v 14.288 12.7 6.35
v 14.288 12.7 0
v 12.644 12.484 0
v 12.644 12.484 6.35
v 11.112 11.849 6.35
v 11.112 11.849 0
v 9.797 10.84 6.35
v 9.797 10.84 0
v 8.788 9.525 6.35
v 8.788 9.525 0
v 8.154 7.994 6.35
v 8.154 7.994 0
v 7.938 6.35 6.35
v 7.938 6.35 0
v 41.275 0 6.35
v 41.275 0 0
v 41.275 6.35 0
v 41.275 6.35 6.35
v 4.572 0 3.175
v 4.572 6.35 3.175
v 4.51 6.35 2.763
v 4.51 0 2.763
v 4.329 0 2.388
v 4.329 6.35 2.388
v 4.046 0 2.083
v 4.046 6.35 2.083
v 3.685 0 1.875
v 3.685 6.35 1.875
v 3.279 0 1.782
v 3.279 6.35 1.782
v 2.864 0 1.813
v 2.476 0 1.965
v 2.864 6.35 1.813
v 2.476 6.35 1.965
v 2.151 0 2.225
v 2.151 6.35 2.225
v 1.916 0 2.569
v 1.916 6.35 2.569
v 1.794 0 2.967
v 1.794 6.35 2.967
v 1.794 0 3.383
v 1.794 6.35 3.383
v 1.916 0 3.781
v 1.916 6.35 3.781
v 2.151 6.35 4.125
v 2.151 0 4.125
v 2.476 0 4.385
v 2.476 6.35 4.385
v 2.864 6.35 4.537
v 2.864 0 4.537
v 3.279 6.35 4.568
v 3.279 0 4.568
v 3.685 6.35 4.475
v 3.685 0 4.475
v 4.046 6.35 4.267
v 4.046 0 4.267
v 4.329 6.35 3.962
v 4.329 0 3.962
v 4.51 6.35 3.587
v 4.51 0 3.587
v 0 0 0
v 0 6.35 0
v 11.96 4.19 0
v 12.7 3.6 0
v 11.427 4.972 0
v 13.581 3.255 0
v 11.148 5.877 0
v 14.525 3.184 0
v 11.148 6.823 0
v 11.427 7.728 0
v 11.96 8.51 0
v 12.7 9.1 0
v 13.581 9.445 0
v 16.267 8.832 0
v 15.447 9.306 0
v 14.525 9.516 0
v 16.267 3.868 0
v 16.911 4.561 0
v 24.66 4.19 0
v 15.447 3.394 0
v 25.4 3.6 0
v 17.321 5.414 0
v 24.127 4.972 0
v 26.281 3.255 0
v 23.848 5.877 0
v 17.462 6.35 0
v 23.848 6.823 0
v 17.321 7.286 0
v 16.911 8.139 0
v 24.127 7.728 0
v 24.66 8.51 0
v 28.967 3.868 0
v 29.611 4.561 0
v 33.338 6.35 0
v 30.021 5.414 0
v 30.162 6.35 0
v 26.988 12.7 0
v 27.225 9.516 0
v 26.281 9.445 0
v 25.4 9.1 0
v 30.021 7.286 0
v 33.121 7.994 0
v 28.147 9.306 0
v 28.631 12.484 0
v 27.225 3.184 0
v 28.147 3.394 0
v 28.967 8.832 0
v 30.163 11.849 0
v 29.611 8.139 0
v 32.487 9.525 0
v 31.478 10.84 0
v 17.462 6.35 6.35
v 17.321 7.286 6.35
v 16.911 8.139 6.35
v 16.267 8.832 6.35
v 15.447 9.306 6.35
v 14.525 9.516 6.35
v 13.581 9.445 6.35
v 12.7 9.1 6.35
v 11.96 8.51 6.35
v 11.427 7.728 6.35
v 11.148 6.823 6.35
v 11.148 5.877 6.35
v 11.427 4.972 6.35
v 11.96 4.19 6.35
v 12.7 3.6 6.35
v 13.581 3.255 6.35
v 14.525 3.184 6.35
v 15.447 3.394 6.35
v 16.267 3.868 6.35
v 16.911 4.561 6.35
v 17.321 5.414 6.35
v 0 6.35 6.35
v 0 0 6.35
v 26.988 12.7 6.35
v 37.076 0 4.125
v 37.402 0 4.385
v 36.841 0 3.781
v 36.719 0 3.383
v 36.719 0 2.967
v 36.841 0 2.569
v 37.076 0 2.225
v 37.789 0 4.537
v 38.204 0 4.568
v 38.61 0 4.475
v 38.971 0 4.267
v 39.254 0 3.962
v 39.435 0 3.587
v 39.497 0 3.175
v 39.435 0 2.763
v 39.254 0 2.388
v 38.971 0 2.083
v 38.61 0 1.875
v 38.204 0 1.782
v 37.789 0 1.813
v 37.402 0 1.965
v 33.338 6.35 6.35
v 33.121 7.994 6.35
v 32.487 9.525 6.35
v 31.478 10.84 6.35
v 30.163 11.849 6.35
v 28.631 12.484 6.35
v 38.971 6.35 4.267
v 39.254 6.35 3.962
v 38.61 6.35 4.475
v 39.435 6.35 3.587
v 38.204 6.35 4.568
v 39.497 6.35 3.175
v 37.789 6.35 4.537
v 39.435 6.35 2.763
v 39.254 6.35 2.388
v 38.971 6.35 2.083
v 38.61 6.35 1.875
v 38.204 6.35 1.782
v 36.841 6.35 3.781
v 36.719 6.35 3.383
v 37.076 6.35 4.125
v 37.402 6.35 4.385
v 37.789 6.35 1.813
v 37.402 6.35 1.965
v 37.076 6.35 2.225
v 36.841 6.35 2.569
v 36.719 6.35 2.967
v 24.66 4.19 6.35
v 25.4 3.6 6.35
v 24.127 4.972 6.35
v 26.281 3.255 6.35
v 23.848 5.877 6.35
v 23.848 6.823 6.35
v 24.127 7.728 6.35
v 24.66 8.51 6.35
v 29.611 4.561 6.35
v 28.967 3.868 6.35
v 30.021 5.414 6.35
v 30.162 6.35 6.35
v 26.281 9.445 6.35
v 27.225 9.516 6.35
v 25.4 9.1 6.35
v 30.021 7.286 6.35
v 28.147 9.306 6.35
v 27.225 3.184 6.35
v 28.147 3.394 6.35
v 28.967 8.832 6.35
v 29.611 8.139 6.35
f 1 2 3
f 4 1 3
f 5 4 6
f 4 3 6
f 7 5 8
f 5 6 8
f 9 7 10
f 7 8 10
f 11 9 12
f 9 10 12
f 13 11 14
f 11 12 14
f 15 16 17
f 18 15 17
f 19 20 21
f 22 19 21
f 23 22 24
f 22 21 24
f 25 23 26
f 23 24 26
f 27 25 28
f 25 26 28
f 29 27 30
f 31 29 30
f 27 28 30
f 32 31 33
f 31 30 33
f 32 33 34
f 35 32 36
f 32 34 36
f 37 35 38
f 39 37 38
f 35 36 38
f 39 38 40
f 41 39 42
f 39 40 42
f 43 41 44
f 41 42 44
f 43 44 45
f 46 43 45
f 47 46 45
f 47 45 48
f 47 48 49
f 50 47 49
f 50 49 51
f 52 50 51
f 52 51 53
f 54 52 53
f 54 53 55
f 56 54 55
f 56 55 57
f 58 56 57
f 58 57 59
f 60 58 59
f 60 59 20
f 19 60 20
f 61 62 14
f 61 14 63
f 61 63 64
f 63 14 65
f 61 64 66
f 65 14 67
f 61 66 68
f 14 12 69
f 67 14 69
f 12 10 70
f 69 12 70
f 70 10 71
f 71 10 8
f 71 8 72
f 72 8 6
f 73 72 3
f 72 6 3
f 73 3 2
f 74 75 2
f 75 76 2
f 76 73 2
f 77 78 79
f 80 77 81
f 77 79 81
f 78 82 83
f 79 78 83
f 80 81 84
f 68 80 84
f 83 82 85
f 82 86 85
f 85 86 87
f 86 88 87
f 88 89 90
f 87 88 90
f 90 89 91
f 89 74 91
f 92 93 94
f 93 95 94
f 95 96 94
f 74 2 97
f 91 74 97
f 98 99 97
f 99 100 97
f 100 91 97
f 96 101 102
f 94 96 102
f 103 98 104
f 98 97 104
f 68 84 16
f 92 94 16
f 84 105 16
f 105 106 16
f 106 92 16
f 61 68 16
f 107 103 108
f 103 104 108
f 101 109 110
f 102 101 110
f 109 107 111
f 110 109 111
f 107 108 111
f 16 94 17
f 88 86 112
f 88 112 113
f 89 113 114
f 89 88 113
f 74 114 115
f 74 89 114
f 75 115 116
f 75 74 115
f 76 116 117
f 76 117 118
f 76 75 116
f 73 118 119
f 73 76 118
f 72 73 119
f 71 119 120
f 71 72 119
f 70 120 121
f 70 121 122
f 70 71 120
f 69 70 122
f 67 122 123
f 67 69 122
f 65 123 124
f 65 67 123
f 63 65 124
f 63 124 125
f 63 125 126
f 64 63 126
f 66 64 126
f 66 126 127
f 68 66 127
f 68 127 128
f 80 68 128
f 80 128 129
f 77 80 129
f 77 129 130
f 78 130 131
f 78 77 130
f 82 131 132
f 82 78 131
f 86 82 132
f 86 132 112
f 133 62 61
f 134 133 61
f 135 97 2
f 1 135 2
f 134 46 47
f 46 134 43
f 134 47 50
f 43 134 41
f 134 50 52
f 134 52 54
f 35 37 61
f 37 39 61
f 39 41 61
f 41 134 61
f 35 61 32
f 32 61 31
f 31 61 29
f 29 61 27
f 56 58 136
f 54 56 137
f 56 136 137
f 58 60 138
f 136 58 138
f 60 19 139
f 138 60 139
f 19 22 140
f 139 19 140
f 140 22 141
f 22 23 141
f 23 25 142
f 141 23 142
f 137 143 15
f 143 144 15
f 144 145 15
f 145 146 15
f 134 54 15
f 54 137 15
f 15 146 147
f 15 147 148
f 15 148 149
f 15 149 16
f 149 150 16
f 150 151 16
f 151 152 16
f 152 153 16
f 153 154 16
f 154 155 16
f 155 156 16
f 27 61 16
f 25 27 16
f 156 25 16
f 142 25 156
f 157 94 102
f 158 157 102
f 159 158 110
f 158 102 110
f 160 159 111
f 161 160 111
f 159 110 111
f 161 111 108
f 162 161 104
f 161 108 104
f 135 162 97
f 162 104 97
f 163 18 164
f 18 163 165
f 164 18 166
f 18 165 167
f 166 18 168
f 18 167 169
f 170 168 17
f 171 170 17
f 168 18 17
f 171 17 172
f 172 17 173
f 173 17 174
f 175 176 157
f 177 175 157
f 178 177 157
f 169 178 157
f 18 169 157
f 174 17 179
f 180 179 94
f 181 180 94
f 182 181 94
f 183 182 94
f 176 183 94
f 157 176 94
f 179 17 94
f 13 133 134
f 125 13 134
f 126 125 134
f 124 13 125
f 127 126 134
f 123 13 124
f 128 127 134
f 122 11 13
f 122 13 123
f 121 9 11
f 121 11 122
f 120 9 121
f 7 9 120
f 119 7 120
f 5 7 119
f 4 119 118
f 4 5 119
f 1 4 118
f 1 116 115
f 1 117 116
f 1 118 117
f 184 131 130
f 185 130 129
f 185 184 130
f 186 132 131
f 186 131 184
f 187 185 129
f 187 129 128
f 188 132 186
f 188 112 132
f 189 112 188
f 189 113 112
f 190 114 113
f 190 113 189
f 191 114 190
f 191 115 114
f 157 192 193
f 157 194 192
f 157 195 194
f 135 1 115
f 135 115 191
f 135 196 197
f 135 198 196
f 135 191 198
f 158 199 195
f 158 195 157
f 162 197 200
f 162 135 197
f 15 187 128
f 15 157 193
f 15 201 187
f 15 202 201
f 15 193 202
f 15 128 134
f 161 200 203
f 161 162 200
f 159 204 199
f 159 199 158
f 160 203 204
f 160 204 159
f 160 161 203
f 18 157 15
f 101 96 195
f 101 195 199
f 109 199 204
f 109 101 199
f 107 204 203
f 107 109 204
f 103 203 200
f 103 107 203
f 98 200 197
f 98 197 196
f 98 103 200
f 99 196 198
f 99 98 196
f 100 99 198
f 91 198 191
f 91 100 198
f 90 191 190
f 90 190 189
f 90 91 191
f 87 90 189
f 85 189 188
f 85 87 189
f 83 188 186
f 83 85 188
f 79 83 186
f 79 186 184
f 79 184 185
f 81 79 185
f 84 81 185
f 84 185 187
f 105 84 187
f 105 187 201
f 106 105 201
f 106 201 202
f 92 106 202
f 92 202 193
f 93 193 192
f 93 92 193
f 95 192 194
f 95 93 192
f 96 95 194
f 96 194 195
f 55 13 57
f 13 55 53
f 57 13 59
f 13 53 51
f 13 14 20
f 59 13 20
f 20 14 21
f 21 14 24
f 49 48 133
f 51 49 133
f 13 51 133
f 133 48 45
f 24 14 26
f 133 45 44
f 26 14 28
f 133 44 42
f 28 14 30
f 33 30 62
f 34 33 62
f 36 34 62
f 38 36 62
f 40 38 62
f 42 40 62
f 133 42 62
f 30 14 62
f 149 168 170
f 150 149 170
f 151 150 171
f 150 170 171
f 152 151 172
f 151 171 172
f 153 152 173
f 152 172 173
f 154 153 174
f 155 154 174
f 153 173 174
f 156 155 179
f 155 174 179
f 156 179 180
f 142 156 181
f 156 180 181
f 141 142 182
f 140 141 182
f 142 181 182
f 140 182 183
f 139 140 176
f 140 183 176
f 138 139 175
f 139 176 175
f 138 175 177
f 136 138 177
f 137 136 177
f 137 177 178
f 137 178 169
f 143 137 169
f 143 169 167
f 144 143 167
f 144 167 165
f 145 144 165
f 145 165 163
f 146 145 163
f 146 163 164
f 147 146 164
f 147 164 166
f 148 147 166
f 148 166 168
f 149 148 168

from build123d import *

# Parameters (mm, degrees)
SKETCH1_R           = 3.175
BOSS_EXTRUDE1_DEPTH = 6.35
CUT_EXTRUDE1_REACH  = 8.35
SKETCH2_R           = 1.397


with BuildPart() as part:
    # Sketch1 → Boss-Extrude1 (new body)
    with BuildSketch(Plane.XY):
        with BuildLine():
            Line((0, 0), (41.275, 0))
            Line((41.275, 0), (41.275, 6.35))
            Line((41.275, 6.35), (33.3375, 6.35))
            ThreePointArc((33.3375, 6.35), (31.477628061, 10.840128061), (26.9875, 12.7))
            Line((26.9875, 12.7), (14.2875, 12.7))
            ThreePointArc((14.2875, 12.7), (9.797371939, 10.840128061), (7.9375, 6.35))
            Line((7.9375, 6.35), (0, 6.35))
            Line((0, 6.35), (0, 0))
        make_face()
        with Locations((14.2875, 6.35)):
            Circle(SKETCH1_R, mode=Mode.SUBTRACT)
        with Locations((26.9875, 6.35)):
            Circle(SKETCH1_R, mode=Mode.SUBTRACT)
    extrude(amount=BOSS_EXTRUDE1_DEPTH)

    # Sketch2 → Cut-Extrude1 (cut, up to next)
    with BuildSketch(Plane(origin=(0, 6.35, 0), x_dir=(1, 0, 0), z_dir=(0, 1, 0)), mode=Mode.PRIVATE) as cut_extrude1_sk1:
        with Locations((38.1, -3.175)):
            Circle(SKETCH2_R)
    cut_extrude1_tool1 = extrude(cut_extrude1_sk1.sketch, amount=-CUT_EXTRUDE1_REACH, mode=Mode.PRIVATE) & part.part
    add(cut_extrude1_tool1.solids().sort_by_distance((38.1, 6.35, 3.175))[0], mode=Mode.SUBTRACT)
    # Sketch2 → Cut-Extrude1 (cut, up to next)
    with BuildSketch(Plane(origin=(0, 6.35, 0), x_dir=(1, 0, 0), z_dir=(0, 1, 0)), mode=Mode.PRIVATE) as cut_extrude1_sk2:
        with Locations((3.175, -3.175)):
            Circle(SKETCH2_R)
    cut_extrude1_tool2 = extrude(cut_extrude1_sk2.sketch, amount=-CUT_EXTRUDE1_REACH, mode=Mode.PRIVATE) & part.part
    add(cut_extrude1_tool2.solids().sort_by_distance((3.175, 6.35, 3.175))[0], mode=Mode.SUBTRACT)


solid = part.part
